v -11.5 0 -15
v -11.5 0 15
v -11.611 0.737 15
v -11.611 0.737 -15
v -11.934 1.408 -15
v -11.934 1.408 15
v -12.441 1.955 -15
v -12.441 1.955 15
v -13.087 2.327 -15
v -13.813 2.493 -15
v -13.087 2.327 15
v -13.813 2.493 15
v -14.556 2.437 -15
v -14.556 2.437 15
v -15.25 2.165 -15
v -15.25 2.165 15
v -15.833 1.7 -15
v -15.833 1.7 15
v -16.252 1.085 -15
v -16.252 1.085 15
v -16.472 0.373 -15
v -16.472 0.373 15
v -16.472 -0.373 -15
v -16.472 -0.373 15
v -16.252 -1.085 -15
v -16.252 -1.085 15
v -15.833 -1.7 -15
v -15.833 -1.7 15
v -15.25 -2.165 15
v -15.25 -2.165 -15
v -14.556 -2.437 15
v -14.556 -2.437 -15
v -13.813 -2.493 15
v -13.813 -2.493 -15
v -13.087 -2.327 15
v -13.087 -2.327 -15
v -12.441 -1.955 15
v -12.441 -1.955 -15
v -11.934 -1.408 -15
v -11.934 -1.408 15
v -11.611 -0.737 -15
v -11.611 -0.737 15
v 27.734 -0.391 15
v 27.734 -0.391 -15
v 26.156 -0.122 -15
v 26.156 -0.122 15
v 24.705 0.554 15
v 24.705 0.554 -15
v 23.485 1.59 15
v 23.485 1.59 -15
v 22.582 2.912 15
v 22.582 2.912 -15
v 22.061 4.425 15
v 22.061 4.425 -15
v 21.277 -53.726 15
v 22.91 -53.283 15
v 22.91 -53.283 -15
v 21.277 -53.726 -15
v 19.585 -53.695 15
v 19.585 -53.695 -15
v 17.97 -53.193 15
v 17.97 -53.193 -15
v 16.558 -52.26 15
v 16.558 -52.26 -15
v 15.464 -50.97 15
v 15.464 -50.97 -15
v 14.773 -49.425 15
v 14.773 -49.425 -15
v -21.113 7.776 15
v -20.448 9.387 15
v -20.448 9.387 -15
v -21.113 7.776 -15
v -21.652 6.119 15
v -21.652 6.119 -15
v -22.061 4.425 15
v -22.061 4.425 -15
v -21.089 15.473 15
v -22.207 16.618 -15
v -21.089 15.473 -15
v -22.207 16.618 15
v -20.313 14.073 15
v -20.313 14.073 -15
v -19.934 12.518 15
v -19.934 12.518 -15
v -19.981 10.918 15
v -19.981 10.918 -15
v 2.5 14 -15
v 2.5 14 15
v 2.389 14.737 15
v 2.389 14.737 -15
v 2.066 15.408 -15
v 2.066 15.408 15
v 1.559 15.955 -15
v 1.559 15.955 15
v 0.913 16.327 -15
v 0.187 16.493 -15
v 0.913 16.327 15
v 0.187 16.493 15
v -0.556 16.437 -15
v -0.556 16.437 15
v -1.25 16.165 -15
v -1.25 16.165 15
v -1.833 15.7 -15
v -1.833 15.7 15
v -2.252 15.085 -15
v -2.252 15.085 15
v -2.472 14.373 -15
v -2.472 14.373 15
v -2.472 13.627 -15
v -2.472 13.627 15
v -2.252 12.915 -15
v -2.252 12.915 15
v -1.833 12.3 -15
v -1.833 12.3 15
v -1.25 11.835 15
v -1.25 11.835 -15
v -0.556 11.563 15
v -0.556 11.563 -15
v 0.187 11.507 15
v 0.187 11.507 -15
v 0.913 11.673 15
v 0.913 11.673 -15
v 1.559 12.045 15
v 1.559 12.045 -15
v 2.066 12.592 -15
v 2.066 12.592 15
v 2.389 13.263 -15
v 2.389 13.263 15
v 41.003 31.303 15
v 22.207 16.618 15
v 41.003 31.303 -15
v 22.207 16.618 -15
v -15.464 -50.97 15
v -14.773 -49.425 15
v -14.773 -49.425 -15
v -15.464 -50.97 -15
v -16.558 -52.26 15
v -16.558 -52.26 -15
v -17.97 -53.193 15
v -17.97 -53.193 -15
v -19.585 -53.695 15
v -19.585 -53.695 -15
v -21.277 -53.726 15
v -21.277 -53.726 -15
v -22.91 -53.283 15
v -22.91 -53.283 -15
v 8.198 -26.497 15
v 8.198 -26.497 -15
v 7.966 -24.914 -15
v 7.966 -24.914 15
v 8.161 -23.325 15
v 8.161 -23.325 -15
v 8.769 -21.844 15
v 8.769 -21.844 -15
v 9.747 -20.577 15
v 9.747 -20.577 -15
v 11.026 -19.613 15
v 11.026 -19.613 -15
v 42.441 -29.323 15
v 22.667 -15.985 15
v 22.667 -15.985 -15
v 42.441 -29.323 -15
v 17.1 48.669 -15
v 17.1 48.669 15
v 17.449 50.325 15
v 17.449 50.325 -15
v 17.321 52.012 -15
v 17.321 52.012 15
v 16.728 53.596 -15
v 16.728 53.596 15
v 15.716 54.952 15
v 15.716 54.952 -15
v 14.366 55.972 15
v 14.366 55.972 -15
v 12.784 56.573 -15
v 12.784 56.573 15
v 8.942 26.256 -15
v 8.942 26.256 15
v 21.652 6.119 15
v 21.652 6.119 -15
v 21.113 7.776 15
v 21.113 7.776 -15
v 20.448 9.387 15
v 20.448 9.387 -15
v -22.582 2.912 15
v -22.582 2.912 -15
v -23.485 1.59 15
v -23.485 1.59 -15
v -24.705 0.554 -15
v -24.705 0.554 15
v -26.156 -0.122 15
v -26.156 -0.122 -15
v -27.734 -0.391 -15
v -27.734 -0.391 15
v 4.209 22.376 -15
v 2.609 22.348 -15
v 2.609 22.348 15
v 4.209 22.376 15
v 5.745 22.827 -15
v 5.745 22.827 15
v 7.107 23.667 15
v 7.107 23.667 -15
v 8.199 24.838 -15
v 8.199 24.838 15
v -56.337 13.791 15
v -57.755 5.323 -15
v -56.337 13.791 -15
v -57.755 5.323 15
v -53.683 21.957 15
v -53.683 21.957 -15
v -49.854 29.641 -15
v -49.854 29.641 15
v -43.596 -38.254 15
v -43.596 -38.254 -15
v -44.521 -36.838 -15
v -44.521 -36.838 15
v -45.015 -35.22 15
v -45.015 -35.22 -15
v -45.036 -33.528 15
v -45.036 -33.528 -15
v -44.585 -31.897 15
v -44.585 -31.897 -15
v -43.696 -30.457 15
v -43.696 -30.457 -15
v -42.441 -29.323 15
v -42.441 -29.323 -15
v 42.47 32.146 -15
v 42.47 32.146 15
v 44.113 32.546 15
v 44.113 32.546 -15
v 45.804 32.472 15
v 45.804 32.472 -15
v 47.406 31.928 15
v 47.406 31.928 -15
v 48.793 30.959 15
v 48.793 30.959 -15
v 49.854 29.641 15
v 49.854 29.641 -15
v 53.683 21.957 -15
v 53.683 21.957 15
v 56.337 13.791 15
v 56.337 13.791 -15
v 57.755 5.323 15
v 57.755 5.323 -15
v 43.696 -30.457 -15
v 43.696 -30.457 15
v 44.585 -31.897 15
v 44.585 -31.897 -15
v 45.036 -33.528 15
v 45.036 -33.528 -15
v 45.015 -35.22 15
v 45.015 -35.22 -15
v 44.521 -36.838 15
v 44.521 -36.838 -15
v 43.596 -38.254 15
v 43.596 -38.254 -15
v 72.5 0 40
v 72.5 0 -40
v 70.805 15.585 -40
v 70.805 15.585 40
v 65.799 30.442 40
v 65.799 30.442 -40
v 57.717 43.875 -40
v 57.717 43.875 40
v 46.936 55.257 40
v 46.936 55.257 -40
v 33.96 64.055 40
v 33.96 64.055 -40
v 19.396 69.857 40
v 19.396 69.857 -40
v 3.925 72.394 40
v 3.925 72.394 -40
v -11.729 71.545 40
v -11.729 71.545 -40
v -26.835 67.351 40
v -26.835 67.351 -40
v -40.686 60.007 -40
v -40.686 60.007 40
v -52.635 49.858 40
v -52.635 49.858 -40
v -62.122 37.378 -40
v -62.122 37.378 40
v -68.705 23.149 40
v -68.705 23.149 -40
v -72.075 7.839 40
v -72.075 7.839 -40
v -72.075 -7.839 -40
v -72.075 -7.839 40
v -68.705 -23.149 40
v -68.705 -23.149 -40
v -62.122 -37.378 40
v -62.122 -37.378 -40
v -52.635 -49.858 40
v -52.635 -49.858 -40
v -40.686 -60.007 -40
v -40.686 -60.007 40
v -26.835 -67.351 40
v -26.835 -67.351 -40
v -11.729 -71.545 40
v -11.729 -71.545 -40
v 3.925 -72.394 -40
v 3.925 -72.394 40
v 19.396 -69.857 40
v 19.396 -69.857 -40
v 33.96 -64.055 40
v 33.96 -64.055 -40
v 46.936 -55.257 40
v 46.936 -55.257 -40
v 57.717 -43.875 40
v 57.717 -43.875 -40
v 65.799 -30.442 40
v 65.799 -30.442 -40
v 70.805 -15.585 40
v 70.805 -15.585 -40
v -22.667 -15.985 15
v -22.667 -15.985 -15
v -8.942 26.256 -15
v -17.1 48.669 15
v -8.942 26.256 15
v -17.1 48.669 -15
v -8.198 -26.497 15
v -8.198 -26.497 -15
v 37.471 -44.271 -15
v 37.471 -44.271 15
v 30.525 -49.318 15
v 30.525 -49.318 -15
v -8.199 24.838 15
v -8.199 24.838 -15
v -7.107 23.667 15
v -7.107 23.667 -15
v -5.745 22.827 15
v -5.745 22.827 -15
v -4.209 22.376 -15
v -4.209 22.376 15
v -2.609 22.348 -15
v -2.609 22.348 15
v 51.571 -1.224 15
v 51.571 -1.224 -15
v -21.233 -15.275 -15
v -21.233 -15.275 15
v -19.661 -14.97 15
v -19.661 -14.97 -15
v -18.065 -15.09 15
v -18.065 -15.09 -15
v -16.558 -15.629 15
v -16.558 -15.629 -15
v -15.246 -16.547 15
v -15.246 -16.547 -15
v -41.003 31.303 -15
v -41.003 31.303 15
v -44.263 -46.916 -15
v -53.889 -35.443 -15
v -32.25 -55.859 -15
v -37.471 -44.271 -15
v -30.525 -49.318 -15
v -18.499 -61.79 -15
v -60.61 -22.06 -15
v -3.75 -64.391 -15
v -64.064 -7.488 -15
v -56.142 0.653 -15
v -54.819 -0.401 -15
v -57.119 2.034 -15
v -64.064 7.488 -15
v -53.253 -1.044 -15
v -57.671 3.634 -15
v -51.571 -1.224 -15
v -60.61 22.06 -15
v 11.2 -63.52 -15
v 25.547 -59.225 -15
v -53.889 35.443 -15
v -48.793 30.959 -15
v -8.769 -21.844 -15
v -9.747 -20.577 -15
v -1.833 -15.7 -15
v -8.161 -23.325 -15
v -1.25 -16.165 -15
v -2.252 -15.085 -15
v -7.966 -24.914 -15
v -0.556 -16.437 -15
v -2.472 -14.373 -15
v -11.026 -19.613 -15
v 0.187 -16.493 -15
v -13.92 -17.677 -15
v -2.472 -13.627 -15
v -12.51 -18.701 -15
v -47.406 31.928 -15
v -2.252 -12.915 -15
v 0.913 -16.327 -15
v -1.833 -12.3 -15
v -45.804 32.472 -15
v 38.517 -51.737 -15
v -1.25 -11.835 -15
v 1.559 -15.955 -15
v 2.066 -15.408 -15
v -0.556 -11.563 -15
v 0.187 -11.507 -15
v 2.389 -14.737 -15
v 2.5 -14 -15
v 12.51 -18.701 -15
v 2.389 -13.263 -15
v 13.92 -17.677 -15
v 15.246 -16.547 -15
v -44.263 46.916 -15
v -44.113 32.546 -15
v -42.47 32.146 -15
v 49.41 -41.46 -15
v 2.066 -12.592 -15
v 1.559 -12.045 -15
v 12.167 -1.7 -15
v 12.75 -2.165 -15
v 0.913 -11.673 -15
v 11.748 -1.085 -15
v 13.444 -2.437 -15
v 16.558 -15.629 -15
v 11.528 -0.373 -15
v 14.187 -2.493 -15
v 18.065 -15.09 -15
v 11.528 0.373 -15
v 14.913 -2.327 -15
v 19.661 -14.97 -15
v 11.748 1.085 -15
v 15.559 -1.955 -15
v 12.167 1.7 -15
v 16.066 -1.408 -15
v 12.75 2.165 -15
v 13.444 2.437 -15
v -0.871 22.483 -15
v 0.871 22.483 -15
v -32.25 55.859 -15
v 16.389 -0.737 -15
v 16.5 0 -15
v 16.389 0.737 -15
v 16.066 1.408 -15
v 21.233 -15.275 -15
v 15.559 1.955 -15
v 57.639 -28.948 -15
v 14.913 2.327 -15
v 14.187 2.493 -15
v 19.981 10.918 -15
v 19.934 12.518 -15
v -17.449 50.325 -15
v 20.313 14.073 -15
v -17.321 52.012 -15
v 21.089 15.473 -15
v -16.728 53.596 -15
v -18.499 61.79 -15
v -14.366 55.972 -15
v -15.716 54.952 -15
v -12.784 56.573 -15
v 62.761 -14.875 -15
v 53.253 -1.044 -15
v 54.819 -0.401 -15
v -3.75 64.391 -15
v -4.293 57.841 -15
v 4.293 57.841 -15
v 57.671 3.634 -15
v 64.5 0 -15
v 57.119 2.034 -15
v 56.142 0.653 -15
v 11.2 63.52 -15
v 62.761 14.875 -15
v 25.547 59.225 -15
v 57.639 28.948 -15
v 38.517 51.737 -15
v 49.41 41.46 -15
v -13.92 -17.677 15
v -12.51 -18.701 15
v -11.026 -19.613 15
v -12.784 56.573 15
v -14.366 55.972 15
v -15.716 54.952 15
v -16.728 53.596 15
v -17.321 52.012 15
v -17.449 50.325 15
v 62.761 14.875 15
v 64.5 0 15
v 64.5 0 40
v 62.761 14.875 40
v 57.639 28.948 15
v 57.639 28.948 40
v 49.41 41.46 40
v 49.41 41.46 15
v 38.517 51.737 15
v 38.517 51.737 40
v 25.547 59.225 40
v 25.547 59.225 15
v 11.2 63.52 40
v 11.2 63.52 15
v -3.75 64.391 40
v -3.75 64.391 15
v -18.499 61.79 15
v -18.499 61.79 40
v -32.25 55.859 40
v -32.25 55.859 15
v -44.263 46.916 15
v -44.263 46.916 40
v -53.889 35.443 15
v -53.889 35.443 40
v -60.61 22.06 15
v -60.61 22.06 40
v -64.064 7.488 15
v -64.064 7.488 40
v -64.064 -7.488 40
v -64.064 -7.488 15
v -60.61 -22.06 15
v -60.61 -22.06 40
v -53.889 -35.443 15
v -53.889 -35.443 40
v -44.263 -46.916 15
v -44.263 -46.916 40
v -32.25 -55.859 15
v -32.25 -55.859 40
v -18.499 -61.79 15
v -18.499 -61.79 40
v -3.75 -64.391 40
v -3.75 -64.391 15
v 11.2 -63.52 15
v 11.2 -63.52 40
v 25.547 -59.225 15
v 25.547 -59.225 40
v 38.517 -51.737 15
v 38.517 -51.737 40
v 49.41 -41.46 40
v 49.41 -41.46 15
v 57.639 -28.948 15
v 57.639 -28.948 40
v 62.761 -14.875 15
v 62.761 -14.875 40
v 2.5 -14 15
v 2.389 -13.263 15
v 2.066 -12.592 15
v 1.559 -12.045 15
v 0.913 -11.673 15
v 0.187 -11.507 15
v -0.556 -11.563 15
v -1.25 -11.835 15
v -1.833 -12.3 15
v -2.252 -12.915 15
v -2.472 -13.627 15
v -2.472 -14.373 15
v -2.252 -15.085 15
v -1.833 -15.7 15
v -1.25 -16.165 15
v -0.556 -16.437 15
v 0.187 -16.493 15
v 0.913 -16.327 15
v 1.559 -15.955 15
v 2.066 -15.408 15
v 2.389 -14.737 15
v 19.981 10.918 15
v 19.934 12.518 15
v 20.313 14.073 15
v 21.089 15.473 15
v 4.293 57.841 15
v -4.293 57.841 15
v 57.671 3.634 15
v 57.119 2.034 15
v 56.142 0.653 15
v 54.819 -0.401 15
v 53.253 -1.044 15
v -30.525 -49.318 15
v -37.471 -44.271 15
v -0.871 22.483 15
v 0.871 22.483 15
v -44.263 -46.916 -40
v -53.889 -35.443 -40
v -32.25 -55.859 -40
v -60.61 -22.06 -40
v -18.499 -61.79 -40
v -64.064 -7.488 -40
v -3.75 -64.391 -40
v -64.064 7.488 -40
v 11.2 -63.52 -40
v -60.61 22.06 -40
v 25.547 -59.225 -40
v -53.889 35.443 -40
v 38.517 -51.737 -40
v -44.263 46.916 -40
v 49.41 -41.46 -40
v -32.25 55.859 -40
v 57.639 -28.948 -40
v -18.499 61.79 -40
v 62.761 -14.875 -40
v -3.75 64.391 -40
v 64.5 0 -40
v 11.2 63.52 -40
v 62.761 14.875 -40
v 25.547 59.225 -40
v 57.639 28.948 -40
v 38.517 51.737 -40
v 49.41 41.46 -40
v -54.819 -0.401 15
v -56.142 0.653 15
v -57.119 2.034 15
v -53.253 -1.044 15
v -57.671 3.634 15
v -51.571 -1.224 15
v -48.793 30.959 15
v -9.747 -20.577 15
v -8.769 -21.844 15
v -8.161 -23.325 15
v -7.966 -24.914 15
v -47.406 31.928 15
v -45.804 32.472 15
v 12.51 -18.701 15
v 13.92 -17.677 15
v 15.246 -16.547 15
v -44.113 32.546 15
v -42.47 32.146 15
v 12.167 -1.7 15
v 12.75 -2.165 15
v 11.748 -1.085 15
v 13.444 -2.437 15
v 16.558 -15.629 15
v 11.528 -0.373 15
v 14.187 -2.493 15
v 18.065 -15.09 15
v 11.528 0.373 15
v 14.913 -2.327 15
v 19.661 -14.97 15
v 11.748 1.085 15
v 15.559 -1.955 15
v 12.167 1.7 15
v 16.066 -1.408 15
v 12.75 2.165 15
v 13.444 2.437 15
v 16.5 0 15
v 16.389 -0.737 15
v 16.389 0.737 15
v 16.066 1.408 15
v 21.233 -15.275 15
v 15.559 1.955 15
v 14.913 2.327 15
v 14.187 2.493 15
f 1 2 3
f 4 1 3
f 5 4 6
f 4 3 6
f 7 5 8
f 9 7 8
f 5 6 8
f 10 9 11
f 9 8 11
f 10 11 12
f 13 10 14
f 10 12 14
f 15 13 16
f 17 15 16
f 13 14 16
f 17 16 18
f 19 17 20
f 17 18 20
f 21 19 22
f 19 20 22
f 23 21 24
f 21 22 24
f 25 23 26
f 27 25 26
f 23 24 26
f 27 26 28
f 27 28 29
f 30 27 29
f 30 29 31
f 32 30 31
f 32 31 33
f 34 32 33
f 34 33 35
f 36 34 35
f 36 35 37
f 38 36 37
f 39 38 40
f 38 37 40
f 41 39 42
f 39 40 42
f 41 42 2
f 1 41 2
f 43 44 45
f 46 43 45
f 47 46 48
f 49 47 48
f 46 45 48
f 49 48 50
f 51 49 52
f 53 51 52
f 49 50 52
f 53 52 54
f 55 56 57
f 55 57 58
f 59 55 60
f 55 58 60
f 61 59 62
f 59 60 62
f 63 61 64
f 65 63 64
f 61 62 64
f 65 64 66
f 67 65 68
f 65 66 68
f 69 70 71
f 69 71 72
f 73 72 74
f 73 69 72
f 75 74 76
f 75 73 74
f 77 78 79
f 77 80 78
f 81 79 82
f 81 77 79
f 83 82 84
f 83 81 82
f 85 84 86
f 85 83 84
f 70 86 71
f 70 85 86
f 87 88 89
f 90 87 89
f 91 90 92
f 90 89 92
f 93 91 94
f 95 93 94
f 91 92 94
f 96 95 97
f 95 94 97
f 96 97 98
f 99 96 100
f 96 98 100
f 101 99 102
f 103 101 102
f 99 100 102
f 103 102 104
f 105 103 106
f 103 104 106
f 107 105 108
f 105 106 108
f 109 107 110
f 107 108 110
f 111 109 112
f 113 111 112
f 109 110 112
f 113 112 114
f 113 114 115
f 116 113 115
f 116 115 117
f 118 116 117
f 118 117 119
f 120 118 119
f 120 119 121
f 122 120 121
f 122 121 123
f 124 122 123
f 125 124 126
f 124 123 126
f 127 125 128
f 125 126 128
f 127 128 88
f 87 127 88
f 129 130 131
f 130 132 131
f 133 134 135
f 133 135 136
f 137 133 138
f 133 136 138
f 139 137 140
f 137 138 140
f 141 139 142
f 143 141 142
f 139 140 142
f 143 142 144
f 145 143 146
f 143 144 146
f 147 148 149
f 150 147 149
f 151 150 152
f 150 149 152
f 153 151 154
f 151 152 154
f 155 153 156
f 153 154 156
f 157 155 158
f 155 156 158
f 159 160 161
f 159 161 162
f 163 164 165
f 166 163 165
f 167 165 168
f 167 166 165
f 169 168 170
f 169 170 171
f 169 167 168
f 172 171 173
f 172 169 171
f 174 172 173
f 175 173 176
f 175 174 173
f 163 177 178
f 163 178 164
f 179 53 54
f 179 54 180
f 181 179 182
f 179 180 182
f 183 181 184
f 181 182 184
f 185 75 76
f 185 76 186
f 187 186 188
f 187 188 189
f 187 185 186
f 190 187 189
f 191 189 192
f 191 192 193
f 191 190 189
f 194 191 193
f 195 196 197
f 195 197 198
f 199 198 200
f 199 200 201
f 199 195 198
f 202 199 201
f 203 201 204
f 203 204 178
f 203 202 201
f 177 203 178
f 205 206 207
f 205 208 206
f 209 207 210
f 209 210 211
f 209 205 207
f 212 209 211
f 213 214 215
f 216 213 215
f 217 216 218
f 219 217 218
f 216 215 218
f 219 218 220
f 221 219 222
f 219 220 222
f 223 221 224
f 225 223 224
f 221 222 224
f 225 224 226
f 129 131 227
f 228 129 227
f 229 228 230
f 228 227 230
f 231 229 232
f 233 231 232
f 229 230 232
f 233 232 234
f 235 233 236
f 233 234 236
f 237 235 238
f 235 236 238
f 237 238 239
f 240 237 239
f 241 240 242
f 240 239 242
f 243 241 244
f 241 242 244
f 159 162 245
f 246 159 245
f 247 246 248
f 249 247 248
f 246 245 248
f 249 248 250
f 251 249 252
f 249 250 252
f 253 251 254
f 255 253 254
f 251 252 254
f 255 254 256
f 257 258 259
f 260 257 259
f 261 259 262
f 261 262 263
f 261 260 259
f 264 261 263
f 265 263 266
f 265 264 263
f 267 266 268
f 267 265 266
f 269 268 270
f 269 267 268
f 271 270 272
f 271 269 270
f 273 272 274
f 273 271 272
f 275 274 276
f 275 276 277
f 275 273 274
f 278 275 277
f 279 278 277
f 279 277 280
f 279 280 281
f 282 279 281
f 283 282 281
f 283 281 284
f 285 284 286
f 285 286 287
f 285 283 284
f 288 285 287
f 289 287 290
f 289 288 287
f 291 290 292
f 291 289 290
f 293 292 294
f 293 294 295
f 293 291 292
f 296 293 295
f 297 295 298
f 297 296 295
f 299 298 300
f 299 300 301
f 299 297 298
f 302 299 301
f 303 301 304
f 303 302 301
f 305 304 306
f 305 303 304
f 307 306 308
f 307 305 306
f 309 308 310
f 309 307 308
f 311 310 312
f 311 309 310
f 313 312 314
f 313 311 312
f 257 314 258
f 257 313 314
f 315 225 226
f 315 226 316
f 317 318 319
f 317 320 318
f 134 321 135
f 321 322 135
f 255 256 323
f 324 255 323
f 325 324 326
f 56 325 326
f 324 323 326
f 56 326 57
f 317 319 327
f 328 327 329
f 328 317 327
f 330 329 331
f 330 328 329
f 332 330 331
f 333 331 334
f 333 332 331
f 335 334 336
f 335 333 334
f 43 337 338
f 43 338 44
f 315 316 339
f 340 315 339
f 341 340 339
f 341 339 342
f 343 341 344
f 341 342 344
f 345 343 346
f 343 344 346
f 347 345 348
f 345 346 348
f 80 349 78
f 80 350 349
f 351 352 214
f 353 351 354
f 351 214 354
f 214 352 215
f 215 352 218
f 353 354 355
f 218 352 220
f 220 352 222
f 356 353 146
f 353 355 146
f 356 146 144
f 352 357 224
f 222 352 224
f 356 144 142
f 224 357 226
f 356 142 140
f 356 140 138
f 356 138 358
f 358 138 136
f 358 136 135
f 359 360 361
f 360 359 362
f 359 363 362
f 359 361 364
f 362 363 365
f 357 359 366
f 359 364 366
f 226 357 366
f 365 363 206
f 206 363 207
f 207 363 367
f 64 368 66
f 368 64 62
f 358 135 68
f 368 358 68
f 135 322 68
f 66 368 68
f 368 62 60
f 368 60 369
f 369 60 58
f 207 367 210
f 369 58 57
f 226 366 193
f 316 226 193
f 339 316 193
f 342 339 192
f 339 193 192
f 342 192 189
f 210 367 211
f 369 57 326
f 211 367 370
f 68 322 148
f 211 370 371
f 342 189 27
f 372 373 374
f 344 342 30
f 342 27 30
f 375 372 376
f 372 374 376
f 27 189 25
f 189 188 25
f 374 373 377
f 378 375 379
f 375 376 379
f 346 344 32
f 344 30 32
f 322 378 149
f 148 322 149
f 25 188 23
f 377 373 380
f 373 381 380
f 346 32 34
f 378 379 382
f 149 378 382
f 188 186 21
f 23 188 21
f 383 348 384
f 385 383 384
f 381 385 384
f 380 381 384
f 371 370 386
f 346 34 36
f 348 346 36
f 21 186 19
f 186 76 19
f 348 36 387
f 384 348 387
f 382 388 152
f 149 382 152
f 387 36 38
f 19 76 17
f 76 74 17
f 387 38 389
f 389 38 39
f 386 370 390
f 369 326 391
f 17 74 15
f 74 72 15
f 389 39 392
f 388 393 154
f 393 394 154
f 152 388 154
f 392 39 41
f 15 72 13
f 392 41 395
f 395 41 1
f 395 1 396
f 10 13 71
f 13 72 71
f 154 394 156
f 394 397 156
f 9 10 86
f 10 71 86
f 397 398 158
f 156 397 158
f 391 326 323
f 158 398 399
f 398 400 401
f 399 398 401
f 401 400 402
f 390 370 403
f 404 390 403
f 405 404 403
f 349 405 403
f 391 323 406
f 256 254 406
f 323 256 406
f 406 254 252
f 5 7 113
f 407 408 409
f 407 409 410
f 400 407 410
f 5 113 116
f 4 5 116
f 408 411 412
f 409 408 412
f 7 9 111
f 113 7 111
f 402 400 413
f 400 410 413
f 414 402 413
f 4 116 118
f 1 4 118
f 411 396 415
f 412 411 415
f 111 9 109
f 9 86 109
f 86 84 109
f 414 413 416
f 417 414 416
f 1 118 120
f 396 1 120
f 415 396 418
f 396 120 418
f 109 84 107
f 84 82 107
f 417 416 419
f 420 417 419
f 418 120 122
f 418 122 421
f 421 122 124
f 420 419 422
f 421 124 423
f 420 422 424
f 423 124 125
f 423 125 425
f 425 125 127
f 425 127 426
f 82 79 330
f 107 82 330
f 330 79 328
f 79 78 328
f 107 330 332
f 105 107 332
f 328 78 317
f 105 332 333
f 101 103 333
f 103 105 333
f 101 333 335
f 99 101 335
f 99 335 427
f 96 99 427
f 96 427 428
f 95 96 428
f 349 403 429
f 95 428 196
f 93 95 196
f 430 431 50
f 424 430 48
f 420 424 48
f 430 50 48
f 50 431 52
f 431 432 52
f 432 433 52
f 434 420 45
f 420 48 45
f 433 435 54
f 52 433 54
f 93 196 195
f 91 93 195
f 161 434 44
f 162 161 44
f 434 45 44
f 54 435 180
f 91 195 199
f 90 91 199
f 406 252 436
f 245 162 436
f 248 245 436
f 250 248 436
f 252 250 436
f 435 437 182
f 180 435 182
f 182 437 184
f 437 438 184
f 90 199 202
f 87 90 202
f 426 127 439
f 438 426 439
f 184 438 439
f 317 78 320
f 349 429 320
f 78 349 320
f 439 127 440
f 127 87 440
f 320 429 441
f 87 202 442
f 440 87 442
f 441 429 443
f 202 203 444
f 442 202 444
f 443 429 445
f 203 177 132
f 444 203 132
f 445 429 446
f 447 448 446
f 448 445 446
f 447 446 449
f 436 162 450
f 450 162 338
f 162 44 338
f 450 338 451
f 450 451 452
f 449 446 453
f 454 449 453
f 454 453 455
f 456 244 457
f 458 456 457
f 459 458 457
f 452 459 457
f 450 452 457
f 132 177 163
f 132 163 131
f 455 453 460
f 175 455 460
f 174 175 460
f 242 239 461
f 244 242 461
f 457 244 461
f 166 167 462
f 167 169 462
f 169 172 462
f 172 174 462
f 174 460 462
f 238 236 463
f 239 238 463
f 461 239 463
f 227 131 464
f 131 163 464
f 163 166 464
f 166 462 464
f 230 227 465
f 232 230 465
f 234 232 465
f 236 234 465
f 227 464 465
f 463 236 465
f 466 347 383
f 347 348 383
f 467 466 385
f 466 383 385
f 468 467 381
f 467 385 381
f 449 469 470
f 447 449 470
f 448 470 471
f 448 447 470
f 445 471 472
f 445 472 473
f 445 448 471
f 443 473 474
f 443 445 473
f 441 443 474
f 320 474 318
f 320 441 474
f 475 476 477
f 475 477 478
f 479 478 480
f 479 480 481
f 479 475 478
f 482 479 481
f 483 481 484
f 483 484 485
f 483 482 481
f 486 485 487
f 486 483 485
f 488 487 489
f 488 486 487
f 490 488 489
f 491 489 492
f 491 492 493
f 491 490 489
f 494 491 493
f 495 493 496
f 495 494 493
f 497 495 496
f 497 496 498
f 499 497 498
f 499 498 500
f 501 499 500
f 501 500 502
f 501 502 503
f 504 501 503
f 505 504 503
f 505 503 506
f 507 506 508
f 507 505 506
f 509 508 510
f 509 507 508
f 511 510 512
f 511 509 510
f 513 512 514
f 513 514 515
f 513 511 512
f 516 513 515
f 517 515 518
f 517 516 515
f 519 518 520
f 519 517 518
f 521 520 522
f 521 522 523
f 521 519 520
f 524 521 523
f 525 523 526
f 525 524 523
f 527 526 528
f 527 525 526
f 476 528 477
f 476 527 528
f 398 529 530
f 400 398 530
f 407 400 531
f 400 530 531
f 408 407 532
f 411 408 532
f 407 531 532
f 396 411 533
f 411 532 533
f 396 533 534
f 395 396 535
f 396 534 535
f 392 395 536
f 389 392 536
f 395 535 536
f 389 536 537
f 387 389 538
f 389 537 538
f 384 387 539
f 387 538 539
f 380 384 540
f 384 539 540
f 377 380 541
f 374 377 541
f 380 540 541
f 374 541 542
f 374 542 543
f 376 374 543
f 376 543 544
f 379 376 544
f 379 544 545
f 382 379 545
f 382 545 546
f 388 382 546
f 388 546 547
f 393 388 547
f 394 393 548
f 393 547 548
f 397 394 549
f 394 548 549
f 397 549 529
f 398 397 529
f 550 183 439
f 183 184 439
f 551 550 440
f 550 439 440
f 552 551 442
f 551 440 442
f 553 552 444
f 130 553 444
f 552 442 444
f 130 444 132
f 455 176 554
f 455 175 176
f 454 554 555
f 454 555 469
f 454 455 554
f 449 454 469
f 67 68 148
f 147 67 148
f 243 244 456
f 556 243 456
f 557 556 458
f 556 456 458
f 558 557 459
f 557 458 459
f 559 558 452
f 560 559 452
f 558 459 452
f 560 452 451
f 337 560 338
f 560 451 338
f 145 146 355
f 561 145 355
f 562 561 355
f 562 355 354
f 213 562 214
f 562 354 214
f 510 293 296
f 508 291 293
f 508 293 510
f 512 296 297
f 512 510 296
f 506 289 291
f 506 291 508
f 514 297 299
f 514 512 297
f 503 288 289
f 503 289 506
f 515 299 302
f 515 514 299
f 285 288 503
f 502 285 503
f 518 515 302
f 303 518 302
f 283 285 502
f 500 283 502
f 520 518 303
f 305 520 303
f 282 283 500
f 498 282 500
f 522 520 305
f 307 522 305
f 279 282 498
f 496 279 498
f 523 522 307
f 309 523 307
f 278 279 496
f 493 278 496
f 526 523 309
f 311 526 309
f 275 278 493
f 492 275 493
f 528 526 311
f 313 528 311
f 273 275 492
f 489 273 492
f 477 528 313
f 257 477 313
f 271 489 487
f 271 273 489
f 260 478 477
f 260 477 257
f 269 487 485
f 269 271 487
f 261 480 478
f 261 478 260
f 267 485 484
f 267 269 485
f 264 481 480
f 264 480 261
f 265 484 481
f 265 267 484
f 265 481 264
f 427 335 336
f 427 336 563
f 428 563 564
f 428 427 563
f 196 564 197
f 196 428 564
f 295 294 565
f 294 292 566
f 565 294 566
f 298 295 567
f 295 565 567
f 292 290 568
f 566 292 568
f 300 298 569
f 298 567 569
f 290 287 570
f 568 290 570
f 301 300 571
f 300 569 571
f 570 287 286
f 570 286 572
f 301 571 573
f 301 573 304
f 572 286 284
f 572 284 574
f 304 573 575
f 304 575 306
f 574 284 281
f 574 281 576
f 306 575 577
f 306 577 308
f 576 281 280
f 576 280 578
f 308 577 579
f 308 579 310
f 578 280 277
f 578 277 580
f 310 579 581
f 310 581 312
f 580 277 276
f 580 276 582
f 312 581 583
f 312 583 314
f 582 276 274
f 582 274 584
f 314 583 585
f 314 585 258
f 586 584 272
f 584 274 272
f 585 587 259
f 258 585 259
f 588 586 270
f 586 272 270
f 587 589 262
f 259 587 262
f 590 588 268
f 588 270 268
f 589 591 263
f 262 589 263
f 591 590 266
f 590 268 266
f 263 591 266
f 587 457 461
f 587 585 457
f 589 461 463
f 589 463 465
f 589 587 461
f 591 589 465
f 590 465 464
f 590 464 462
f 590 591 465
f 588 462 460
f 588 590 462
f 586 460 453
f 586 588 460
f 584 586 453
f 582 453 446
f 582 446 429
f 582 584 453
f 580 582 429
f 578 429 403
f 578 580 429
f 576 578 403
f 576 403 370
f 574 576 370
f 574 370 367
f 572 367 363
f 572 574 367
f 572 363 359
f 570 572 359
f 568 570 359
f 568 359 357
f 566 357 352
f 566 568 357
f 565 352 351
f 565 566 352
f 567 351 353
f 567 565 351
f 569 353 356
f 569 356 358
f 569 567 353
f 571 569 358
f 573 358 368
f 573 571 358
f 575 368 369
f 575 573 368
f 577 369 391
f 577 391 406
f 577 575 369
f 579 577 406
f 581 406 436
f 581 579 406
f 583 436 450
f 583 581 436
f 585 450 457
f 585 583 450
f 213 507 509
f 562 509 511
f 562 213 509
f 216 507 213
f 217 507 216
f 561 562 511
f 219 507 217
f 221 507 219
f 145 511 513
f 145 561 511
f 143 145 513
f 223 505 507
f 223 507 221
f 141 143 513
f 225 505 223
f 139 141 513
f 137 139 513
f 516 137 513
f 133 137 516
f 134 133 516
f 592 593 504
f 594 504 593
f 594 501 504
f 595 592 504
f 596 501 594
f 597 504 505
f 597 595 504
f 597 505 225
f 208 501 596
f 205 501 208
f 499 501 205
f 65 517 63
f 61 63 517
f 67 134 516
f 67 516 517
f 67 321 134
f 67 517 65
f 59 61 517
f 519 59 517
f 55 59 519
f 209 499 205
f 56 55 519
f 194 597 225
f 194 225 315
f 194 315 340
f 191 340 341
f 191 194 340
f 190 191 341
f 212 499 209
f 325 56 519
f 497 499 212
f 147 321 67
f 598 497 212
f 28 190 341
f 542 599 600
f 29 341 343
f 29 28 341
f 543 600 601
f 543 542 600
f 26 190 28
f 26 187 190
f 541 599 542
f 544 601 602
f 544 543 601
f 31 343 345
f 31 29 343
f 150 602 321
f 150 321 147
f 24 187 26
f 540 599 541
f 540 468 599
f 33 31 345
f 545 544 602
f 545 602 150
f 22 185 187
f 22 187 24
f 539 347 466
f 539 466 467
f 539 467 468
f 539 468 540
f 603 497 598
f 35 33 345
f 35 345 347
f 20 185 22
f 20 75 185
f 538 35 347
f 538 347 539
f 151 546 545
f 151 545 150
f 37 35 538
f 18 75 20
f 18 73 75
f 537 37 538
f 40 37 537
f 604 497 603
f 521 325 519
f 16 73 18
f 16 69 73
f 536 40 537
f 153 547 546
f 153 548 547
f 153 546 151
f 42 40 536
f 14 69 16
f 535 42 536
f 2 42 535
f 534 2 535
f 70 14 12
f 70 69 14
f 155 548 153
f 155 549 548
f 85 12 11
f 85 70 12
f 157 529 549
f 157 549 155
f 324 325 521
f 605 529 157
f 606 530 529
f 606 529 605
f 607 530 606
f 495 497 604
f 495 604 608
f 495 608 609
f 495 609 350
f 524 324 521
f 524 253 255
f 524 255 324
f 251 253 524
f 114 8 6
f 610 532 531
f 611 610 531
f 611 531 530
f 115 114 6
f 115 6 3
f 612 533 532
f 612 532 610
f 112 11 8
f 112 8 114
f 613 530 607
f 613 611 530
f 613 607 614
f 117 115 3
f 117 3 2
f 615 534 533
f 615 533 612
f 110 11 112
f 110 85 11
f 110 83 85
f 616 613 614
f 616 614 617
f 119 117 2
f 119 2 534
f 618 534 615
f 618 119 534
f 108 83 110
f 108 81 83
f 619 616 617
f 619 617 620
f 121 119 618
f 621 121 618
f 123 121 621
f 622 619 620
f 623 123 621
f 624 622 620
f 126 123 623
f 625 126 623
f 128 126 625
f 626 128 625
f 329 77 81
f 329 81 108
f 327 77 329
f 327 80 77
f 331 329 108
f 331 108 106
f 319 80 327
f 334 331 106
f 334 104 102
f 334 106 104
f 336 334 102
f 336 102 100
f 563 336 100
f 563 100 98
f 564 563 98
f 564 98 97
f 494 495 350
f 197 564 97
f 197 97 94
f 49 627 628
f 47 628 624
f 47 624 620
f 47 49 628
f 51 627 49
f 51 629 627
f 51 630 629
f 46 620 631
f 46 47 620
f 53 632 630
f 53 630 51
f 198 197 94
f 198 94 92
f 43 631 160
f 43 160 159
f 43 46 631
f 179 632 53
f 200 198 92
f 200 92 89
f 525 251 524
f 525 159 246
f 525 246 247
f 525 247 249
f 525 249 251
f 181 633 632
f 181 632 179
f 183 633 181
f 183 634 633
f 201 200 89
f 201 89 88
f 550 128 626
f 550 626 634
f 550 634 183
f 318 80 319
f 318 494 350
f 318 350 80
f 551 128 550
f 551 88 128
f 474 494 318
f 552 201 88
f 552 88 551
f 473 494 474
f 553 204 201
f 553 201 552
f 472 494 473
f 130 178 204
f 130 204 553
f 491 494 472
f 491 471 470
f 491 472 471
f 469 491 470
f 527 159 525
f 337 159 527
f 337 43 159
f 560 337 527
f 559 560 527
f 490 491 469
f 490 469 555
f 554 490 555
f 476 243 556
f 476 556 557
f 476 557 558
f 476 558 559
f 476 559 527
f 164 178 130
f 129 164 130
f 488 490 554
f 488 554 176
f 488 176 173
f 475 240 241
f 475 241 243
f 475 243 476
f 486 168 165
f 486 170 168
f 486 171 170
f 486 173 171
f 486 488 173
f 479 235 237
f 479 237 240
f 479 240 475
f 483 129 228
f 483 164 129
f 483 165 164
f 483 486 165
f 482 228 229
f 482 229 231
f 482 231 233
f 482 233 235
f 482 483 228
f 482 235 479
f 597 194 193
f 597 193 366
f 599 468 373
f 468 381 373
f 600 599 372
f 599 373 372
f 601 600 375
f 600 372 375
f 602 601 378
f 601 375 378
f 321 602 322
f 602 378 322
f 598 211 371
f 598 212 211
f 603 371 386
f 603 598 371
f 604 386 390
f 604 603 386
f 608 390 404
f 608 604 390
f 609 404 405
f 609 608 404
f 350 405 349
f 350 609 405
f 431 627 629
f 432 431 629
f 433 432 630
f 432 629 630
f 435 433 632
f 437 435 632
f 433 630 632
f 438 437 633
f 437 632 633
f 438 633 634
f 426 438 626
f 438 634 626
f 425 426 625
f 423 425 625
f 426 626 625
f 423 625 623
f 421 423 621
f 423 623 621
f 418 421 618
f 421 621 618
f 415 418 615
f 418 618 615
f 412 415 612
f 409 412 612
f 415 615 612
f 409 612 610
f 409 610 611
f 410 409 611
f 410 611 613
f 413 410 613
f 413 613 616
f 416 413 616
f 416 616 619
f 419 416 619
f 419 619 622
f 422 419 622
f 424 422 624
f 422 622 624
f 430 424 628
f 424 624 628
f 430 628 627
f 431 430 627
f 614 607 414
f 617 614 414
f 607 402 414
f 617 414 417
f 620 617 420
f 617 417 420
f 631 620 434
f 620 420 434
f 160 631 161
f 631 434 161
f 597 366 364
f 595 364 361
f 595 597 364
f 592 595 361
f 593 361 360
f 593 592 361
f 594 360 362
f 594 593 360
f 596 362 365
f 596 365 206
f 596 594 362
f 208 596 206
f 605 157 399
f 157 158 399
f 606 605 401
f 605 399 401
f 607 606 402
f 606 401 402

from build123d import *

# Parameters (mm, degrees)
SKETCH1_R           = 72.5
SKETCH1_R_2         = 64.5
BOSS_EXTRUDE1_DEPTH = 40
SKETCH4_R           = 64.5
BOSS_EXTRUDE3_DEPTH = 15
CUT_EXTRUDE1_DEPTH  = 15
SKETCH6_R           = 2.5
CUT_EXTRUDE2_DEPTH  = 30


with BuildPart() as part:
    # Sketch1 → Boss-Extrude1 (new, symmetric)
    with BuildSketch(Plane.XY):
        Circle(SKETCH1_R)
        Circle(SKETCH1_R_2, mode=Mode.SUBTRACT)
    extrude(amount=BOSS_EXTRUDE1_DEPTH, both=True)

    # Sketch4 → Boss-Extrude3 (add, symmetric)
    with BuildSketch(Plane.XY):
        Circle(SKETCH4_R)
    extrude(amount=BOSS_EXTRUDE3_DEPTH, both=True)

    # Sketch3 → Cut-Extrude1 (cut, symmetric)
    with BuildSketch(Plane.XY):
        with BuildLine():
            Line((8.942342186, 26.255693464), (17.100089792, 48.668920804))
            ThreePointArc((17.100089792, 48.668920804), (16.728172015, 53.596235201), (12.784464921, 56.573469548))
            ThreePointArc((12.784464921, 56.573469548), (0, 58), (-12.784464921, 56.573469548))
            ThreePointArc((-12.784464921, 56.573469548), (-16.728172015, 53.596235201), (-17.100089792, 48.668920804))
            Line((-17.100089792, 48.668920804), (-8.942342186, 26.255693464))
            ThreePointArc((-8.942342186, 26.255693464), (-6.454448371, 23.201362532), (-2.608568259, 22.348274467))
            ThreePointArc((-2.608568259, 22.348274467), (0, 22.5), (2.608568259, 22.348274467))
            ThreePointArc((2.608568259, 22.348274467), (6.454448371, 23.201362532), (8.942342186, 26.255693464))
        make_face()
        with BuildLine():
            Line((22.207312654, 16.618128287), (41.002675921, 31.302675452))
            ThreePointArc((41.002675921, 31.302675452), (45.803759299, 32.471584512), (49.853949939, 29.640912191))
            ThreePointArc((49.853949939, 29.640912191), (55.161277945, 17.922985674), (57.755183787, 5.323414851))
            ThreePointArc((57.755183787, 5.323414851), (56.142338174, 0.652710511), (51.571112622, -1.223628199))
            Line((51.571112622, -1.223628199), (27.733984064, -0.391217328))
            ThreePointArc((27.733984064, -0.391217328), (24.060341259, 1.031070133), (22.060563983, 4.425100764))
            ThreePointArc((22.060563983, 4.425100764), (21.398771617, 6.952882373), (20.448380136, 9.386892446))
            ThreePointArc((20.448380136, 9.386892446), (20.071272788, 13.308160497), (22.207312654, 16.618128287))
        make_face()
        with BuildLine():
            Line((22.667216205, -15.985125354), (42.44113714, -29.322803436))
            ThreePointArc((42.44113714, -29.322803436), (45.036452074, -33.527692304), (43.595900456, -38.254378356))
            ThreePointArc((43.595900456, -38.254378356), (34.091544633, -46.922985674), (22.910201686, -53.283418234))
            ThreePointArc((22.910201686, -53.283418234), (17.969701185, -53.19283792), (14.772610647, -49.42516462))
            Line((14.772610647, -49.42516462), (8.198202609, -26.49747907))
            ThreePointArc((8.198202609, -26.49747907), (8.415660309, -22.564126145), (11.025610093, -19.613411791))
            ThreePointArc((11.025610093, -19.613411791), (13.225168177, -18.202882373), (15.246362198, -16.546855886))
            ThreePointArc((15.246362198, -16.546855886), (18.859177151, -14.976467017), (22.667216205, -15.985125354))
        make_face()
        with BuildLine():
            Line((-8.198202609, -26.49747907), (-14.772610647, -49.42516462))
            ThreePointArc((-14.772610647, -49.42516462), (-17.969701185, -53.19283792), (-22.910201686, -53.283418234))
            ThreePointArc((-22.910201686, -53.283418234), (-34.091544633, -46.922985674), (-43.595900456, -38.254378356))
            ThreePointArc((-43.595900456, -38.254378356), (-45.036452074, -33.527692304), (-42.44113714, -29.322803436))
            Line((-42.44113714, -29.322803436), (-22.667216205, -15.985125354))
            ThreePointArc((-22.667216205, -15.985125354), (-18.859177151, -14.976467017), (-15.246362198, -16.546855886))
            ThreePointArc((-15.246362198, -16.546855886), (-13.225168177, -18.202882373), (-11.025610093, -19.613411791))
            ThreePointArc((-11.025610093, -19.613411791), (-8.415660309, -22.564126145), (-8.198202609, -26.49747907))
        make_face()
        with BuildLine():
            Line((-27.733984064, -0.391217328), (-51.571112622, -1.223628199))
            ThreePointArc((-51.571112622, -1.223628199), (-56.142338174, 0.652710511), (-57.755183787, 5.323414851))
            ThreePointArc((-57.755183787, 5.323414851), (-55.161277945, 17.922985674), (-49.853949939, 29.640912191))
            ThreePointArc((-49.853949939, 29.640912191), (-45.803759299, 32.471584512), (-41.002675921, 31.302675452))
            Line((-41.002675921, 31.302675452), (-22.207312654, 16.618128287))
            ThreePointArc((-22.207312654, 16.618128287), (-20.071272788, 13.308160497), (-20.448380136, 9.386892446))
            ThreePointArc((-20.448380136, 9.386892446), (-21.398771617, 6.952882373), (-22.060563983, 4.425100764))
            ThreePointArc((-22.060563983, 4.425100764), (-24.060341259, 1.031070133), (-27.733984064, -0.391217328))
        make_face()
    extrude(amount=CUT_EXTRUDE1_DEPTH, both=True, mode=Mode.SUBTRACT)

    # Sketch6 → Cut-Extrude2 (cut)
    with BuildSketch(Plane.XY.offset(15)):
        with Locations((0, 14)):
            Circle(SKETCH6_R)
        with Locations((14, 0)):
            Circle(SKETCH6_R)
        with Locations((0, -14)):
            Circle(SKETCH6_R)
        with Locations((-14, 0)):
            Circle(SKETCH6_R)
    extrude(amount=-CUT_EXTRUDE2_DEPTH, mode=Mode.SUBTRACT)


solid = part.part
